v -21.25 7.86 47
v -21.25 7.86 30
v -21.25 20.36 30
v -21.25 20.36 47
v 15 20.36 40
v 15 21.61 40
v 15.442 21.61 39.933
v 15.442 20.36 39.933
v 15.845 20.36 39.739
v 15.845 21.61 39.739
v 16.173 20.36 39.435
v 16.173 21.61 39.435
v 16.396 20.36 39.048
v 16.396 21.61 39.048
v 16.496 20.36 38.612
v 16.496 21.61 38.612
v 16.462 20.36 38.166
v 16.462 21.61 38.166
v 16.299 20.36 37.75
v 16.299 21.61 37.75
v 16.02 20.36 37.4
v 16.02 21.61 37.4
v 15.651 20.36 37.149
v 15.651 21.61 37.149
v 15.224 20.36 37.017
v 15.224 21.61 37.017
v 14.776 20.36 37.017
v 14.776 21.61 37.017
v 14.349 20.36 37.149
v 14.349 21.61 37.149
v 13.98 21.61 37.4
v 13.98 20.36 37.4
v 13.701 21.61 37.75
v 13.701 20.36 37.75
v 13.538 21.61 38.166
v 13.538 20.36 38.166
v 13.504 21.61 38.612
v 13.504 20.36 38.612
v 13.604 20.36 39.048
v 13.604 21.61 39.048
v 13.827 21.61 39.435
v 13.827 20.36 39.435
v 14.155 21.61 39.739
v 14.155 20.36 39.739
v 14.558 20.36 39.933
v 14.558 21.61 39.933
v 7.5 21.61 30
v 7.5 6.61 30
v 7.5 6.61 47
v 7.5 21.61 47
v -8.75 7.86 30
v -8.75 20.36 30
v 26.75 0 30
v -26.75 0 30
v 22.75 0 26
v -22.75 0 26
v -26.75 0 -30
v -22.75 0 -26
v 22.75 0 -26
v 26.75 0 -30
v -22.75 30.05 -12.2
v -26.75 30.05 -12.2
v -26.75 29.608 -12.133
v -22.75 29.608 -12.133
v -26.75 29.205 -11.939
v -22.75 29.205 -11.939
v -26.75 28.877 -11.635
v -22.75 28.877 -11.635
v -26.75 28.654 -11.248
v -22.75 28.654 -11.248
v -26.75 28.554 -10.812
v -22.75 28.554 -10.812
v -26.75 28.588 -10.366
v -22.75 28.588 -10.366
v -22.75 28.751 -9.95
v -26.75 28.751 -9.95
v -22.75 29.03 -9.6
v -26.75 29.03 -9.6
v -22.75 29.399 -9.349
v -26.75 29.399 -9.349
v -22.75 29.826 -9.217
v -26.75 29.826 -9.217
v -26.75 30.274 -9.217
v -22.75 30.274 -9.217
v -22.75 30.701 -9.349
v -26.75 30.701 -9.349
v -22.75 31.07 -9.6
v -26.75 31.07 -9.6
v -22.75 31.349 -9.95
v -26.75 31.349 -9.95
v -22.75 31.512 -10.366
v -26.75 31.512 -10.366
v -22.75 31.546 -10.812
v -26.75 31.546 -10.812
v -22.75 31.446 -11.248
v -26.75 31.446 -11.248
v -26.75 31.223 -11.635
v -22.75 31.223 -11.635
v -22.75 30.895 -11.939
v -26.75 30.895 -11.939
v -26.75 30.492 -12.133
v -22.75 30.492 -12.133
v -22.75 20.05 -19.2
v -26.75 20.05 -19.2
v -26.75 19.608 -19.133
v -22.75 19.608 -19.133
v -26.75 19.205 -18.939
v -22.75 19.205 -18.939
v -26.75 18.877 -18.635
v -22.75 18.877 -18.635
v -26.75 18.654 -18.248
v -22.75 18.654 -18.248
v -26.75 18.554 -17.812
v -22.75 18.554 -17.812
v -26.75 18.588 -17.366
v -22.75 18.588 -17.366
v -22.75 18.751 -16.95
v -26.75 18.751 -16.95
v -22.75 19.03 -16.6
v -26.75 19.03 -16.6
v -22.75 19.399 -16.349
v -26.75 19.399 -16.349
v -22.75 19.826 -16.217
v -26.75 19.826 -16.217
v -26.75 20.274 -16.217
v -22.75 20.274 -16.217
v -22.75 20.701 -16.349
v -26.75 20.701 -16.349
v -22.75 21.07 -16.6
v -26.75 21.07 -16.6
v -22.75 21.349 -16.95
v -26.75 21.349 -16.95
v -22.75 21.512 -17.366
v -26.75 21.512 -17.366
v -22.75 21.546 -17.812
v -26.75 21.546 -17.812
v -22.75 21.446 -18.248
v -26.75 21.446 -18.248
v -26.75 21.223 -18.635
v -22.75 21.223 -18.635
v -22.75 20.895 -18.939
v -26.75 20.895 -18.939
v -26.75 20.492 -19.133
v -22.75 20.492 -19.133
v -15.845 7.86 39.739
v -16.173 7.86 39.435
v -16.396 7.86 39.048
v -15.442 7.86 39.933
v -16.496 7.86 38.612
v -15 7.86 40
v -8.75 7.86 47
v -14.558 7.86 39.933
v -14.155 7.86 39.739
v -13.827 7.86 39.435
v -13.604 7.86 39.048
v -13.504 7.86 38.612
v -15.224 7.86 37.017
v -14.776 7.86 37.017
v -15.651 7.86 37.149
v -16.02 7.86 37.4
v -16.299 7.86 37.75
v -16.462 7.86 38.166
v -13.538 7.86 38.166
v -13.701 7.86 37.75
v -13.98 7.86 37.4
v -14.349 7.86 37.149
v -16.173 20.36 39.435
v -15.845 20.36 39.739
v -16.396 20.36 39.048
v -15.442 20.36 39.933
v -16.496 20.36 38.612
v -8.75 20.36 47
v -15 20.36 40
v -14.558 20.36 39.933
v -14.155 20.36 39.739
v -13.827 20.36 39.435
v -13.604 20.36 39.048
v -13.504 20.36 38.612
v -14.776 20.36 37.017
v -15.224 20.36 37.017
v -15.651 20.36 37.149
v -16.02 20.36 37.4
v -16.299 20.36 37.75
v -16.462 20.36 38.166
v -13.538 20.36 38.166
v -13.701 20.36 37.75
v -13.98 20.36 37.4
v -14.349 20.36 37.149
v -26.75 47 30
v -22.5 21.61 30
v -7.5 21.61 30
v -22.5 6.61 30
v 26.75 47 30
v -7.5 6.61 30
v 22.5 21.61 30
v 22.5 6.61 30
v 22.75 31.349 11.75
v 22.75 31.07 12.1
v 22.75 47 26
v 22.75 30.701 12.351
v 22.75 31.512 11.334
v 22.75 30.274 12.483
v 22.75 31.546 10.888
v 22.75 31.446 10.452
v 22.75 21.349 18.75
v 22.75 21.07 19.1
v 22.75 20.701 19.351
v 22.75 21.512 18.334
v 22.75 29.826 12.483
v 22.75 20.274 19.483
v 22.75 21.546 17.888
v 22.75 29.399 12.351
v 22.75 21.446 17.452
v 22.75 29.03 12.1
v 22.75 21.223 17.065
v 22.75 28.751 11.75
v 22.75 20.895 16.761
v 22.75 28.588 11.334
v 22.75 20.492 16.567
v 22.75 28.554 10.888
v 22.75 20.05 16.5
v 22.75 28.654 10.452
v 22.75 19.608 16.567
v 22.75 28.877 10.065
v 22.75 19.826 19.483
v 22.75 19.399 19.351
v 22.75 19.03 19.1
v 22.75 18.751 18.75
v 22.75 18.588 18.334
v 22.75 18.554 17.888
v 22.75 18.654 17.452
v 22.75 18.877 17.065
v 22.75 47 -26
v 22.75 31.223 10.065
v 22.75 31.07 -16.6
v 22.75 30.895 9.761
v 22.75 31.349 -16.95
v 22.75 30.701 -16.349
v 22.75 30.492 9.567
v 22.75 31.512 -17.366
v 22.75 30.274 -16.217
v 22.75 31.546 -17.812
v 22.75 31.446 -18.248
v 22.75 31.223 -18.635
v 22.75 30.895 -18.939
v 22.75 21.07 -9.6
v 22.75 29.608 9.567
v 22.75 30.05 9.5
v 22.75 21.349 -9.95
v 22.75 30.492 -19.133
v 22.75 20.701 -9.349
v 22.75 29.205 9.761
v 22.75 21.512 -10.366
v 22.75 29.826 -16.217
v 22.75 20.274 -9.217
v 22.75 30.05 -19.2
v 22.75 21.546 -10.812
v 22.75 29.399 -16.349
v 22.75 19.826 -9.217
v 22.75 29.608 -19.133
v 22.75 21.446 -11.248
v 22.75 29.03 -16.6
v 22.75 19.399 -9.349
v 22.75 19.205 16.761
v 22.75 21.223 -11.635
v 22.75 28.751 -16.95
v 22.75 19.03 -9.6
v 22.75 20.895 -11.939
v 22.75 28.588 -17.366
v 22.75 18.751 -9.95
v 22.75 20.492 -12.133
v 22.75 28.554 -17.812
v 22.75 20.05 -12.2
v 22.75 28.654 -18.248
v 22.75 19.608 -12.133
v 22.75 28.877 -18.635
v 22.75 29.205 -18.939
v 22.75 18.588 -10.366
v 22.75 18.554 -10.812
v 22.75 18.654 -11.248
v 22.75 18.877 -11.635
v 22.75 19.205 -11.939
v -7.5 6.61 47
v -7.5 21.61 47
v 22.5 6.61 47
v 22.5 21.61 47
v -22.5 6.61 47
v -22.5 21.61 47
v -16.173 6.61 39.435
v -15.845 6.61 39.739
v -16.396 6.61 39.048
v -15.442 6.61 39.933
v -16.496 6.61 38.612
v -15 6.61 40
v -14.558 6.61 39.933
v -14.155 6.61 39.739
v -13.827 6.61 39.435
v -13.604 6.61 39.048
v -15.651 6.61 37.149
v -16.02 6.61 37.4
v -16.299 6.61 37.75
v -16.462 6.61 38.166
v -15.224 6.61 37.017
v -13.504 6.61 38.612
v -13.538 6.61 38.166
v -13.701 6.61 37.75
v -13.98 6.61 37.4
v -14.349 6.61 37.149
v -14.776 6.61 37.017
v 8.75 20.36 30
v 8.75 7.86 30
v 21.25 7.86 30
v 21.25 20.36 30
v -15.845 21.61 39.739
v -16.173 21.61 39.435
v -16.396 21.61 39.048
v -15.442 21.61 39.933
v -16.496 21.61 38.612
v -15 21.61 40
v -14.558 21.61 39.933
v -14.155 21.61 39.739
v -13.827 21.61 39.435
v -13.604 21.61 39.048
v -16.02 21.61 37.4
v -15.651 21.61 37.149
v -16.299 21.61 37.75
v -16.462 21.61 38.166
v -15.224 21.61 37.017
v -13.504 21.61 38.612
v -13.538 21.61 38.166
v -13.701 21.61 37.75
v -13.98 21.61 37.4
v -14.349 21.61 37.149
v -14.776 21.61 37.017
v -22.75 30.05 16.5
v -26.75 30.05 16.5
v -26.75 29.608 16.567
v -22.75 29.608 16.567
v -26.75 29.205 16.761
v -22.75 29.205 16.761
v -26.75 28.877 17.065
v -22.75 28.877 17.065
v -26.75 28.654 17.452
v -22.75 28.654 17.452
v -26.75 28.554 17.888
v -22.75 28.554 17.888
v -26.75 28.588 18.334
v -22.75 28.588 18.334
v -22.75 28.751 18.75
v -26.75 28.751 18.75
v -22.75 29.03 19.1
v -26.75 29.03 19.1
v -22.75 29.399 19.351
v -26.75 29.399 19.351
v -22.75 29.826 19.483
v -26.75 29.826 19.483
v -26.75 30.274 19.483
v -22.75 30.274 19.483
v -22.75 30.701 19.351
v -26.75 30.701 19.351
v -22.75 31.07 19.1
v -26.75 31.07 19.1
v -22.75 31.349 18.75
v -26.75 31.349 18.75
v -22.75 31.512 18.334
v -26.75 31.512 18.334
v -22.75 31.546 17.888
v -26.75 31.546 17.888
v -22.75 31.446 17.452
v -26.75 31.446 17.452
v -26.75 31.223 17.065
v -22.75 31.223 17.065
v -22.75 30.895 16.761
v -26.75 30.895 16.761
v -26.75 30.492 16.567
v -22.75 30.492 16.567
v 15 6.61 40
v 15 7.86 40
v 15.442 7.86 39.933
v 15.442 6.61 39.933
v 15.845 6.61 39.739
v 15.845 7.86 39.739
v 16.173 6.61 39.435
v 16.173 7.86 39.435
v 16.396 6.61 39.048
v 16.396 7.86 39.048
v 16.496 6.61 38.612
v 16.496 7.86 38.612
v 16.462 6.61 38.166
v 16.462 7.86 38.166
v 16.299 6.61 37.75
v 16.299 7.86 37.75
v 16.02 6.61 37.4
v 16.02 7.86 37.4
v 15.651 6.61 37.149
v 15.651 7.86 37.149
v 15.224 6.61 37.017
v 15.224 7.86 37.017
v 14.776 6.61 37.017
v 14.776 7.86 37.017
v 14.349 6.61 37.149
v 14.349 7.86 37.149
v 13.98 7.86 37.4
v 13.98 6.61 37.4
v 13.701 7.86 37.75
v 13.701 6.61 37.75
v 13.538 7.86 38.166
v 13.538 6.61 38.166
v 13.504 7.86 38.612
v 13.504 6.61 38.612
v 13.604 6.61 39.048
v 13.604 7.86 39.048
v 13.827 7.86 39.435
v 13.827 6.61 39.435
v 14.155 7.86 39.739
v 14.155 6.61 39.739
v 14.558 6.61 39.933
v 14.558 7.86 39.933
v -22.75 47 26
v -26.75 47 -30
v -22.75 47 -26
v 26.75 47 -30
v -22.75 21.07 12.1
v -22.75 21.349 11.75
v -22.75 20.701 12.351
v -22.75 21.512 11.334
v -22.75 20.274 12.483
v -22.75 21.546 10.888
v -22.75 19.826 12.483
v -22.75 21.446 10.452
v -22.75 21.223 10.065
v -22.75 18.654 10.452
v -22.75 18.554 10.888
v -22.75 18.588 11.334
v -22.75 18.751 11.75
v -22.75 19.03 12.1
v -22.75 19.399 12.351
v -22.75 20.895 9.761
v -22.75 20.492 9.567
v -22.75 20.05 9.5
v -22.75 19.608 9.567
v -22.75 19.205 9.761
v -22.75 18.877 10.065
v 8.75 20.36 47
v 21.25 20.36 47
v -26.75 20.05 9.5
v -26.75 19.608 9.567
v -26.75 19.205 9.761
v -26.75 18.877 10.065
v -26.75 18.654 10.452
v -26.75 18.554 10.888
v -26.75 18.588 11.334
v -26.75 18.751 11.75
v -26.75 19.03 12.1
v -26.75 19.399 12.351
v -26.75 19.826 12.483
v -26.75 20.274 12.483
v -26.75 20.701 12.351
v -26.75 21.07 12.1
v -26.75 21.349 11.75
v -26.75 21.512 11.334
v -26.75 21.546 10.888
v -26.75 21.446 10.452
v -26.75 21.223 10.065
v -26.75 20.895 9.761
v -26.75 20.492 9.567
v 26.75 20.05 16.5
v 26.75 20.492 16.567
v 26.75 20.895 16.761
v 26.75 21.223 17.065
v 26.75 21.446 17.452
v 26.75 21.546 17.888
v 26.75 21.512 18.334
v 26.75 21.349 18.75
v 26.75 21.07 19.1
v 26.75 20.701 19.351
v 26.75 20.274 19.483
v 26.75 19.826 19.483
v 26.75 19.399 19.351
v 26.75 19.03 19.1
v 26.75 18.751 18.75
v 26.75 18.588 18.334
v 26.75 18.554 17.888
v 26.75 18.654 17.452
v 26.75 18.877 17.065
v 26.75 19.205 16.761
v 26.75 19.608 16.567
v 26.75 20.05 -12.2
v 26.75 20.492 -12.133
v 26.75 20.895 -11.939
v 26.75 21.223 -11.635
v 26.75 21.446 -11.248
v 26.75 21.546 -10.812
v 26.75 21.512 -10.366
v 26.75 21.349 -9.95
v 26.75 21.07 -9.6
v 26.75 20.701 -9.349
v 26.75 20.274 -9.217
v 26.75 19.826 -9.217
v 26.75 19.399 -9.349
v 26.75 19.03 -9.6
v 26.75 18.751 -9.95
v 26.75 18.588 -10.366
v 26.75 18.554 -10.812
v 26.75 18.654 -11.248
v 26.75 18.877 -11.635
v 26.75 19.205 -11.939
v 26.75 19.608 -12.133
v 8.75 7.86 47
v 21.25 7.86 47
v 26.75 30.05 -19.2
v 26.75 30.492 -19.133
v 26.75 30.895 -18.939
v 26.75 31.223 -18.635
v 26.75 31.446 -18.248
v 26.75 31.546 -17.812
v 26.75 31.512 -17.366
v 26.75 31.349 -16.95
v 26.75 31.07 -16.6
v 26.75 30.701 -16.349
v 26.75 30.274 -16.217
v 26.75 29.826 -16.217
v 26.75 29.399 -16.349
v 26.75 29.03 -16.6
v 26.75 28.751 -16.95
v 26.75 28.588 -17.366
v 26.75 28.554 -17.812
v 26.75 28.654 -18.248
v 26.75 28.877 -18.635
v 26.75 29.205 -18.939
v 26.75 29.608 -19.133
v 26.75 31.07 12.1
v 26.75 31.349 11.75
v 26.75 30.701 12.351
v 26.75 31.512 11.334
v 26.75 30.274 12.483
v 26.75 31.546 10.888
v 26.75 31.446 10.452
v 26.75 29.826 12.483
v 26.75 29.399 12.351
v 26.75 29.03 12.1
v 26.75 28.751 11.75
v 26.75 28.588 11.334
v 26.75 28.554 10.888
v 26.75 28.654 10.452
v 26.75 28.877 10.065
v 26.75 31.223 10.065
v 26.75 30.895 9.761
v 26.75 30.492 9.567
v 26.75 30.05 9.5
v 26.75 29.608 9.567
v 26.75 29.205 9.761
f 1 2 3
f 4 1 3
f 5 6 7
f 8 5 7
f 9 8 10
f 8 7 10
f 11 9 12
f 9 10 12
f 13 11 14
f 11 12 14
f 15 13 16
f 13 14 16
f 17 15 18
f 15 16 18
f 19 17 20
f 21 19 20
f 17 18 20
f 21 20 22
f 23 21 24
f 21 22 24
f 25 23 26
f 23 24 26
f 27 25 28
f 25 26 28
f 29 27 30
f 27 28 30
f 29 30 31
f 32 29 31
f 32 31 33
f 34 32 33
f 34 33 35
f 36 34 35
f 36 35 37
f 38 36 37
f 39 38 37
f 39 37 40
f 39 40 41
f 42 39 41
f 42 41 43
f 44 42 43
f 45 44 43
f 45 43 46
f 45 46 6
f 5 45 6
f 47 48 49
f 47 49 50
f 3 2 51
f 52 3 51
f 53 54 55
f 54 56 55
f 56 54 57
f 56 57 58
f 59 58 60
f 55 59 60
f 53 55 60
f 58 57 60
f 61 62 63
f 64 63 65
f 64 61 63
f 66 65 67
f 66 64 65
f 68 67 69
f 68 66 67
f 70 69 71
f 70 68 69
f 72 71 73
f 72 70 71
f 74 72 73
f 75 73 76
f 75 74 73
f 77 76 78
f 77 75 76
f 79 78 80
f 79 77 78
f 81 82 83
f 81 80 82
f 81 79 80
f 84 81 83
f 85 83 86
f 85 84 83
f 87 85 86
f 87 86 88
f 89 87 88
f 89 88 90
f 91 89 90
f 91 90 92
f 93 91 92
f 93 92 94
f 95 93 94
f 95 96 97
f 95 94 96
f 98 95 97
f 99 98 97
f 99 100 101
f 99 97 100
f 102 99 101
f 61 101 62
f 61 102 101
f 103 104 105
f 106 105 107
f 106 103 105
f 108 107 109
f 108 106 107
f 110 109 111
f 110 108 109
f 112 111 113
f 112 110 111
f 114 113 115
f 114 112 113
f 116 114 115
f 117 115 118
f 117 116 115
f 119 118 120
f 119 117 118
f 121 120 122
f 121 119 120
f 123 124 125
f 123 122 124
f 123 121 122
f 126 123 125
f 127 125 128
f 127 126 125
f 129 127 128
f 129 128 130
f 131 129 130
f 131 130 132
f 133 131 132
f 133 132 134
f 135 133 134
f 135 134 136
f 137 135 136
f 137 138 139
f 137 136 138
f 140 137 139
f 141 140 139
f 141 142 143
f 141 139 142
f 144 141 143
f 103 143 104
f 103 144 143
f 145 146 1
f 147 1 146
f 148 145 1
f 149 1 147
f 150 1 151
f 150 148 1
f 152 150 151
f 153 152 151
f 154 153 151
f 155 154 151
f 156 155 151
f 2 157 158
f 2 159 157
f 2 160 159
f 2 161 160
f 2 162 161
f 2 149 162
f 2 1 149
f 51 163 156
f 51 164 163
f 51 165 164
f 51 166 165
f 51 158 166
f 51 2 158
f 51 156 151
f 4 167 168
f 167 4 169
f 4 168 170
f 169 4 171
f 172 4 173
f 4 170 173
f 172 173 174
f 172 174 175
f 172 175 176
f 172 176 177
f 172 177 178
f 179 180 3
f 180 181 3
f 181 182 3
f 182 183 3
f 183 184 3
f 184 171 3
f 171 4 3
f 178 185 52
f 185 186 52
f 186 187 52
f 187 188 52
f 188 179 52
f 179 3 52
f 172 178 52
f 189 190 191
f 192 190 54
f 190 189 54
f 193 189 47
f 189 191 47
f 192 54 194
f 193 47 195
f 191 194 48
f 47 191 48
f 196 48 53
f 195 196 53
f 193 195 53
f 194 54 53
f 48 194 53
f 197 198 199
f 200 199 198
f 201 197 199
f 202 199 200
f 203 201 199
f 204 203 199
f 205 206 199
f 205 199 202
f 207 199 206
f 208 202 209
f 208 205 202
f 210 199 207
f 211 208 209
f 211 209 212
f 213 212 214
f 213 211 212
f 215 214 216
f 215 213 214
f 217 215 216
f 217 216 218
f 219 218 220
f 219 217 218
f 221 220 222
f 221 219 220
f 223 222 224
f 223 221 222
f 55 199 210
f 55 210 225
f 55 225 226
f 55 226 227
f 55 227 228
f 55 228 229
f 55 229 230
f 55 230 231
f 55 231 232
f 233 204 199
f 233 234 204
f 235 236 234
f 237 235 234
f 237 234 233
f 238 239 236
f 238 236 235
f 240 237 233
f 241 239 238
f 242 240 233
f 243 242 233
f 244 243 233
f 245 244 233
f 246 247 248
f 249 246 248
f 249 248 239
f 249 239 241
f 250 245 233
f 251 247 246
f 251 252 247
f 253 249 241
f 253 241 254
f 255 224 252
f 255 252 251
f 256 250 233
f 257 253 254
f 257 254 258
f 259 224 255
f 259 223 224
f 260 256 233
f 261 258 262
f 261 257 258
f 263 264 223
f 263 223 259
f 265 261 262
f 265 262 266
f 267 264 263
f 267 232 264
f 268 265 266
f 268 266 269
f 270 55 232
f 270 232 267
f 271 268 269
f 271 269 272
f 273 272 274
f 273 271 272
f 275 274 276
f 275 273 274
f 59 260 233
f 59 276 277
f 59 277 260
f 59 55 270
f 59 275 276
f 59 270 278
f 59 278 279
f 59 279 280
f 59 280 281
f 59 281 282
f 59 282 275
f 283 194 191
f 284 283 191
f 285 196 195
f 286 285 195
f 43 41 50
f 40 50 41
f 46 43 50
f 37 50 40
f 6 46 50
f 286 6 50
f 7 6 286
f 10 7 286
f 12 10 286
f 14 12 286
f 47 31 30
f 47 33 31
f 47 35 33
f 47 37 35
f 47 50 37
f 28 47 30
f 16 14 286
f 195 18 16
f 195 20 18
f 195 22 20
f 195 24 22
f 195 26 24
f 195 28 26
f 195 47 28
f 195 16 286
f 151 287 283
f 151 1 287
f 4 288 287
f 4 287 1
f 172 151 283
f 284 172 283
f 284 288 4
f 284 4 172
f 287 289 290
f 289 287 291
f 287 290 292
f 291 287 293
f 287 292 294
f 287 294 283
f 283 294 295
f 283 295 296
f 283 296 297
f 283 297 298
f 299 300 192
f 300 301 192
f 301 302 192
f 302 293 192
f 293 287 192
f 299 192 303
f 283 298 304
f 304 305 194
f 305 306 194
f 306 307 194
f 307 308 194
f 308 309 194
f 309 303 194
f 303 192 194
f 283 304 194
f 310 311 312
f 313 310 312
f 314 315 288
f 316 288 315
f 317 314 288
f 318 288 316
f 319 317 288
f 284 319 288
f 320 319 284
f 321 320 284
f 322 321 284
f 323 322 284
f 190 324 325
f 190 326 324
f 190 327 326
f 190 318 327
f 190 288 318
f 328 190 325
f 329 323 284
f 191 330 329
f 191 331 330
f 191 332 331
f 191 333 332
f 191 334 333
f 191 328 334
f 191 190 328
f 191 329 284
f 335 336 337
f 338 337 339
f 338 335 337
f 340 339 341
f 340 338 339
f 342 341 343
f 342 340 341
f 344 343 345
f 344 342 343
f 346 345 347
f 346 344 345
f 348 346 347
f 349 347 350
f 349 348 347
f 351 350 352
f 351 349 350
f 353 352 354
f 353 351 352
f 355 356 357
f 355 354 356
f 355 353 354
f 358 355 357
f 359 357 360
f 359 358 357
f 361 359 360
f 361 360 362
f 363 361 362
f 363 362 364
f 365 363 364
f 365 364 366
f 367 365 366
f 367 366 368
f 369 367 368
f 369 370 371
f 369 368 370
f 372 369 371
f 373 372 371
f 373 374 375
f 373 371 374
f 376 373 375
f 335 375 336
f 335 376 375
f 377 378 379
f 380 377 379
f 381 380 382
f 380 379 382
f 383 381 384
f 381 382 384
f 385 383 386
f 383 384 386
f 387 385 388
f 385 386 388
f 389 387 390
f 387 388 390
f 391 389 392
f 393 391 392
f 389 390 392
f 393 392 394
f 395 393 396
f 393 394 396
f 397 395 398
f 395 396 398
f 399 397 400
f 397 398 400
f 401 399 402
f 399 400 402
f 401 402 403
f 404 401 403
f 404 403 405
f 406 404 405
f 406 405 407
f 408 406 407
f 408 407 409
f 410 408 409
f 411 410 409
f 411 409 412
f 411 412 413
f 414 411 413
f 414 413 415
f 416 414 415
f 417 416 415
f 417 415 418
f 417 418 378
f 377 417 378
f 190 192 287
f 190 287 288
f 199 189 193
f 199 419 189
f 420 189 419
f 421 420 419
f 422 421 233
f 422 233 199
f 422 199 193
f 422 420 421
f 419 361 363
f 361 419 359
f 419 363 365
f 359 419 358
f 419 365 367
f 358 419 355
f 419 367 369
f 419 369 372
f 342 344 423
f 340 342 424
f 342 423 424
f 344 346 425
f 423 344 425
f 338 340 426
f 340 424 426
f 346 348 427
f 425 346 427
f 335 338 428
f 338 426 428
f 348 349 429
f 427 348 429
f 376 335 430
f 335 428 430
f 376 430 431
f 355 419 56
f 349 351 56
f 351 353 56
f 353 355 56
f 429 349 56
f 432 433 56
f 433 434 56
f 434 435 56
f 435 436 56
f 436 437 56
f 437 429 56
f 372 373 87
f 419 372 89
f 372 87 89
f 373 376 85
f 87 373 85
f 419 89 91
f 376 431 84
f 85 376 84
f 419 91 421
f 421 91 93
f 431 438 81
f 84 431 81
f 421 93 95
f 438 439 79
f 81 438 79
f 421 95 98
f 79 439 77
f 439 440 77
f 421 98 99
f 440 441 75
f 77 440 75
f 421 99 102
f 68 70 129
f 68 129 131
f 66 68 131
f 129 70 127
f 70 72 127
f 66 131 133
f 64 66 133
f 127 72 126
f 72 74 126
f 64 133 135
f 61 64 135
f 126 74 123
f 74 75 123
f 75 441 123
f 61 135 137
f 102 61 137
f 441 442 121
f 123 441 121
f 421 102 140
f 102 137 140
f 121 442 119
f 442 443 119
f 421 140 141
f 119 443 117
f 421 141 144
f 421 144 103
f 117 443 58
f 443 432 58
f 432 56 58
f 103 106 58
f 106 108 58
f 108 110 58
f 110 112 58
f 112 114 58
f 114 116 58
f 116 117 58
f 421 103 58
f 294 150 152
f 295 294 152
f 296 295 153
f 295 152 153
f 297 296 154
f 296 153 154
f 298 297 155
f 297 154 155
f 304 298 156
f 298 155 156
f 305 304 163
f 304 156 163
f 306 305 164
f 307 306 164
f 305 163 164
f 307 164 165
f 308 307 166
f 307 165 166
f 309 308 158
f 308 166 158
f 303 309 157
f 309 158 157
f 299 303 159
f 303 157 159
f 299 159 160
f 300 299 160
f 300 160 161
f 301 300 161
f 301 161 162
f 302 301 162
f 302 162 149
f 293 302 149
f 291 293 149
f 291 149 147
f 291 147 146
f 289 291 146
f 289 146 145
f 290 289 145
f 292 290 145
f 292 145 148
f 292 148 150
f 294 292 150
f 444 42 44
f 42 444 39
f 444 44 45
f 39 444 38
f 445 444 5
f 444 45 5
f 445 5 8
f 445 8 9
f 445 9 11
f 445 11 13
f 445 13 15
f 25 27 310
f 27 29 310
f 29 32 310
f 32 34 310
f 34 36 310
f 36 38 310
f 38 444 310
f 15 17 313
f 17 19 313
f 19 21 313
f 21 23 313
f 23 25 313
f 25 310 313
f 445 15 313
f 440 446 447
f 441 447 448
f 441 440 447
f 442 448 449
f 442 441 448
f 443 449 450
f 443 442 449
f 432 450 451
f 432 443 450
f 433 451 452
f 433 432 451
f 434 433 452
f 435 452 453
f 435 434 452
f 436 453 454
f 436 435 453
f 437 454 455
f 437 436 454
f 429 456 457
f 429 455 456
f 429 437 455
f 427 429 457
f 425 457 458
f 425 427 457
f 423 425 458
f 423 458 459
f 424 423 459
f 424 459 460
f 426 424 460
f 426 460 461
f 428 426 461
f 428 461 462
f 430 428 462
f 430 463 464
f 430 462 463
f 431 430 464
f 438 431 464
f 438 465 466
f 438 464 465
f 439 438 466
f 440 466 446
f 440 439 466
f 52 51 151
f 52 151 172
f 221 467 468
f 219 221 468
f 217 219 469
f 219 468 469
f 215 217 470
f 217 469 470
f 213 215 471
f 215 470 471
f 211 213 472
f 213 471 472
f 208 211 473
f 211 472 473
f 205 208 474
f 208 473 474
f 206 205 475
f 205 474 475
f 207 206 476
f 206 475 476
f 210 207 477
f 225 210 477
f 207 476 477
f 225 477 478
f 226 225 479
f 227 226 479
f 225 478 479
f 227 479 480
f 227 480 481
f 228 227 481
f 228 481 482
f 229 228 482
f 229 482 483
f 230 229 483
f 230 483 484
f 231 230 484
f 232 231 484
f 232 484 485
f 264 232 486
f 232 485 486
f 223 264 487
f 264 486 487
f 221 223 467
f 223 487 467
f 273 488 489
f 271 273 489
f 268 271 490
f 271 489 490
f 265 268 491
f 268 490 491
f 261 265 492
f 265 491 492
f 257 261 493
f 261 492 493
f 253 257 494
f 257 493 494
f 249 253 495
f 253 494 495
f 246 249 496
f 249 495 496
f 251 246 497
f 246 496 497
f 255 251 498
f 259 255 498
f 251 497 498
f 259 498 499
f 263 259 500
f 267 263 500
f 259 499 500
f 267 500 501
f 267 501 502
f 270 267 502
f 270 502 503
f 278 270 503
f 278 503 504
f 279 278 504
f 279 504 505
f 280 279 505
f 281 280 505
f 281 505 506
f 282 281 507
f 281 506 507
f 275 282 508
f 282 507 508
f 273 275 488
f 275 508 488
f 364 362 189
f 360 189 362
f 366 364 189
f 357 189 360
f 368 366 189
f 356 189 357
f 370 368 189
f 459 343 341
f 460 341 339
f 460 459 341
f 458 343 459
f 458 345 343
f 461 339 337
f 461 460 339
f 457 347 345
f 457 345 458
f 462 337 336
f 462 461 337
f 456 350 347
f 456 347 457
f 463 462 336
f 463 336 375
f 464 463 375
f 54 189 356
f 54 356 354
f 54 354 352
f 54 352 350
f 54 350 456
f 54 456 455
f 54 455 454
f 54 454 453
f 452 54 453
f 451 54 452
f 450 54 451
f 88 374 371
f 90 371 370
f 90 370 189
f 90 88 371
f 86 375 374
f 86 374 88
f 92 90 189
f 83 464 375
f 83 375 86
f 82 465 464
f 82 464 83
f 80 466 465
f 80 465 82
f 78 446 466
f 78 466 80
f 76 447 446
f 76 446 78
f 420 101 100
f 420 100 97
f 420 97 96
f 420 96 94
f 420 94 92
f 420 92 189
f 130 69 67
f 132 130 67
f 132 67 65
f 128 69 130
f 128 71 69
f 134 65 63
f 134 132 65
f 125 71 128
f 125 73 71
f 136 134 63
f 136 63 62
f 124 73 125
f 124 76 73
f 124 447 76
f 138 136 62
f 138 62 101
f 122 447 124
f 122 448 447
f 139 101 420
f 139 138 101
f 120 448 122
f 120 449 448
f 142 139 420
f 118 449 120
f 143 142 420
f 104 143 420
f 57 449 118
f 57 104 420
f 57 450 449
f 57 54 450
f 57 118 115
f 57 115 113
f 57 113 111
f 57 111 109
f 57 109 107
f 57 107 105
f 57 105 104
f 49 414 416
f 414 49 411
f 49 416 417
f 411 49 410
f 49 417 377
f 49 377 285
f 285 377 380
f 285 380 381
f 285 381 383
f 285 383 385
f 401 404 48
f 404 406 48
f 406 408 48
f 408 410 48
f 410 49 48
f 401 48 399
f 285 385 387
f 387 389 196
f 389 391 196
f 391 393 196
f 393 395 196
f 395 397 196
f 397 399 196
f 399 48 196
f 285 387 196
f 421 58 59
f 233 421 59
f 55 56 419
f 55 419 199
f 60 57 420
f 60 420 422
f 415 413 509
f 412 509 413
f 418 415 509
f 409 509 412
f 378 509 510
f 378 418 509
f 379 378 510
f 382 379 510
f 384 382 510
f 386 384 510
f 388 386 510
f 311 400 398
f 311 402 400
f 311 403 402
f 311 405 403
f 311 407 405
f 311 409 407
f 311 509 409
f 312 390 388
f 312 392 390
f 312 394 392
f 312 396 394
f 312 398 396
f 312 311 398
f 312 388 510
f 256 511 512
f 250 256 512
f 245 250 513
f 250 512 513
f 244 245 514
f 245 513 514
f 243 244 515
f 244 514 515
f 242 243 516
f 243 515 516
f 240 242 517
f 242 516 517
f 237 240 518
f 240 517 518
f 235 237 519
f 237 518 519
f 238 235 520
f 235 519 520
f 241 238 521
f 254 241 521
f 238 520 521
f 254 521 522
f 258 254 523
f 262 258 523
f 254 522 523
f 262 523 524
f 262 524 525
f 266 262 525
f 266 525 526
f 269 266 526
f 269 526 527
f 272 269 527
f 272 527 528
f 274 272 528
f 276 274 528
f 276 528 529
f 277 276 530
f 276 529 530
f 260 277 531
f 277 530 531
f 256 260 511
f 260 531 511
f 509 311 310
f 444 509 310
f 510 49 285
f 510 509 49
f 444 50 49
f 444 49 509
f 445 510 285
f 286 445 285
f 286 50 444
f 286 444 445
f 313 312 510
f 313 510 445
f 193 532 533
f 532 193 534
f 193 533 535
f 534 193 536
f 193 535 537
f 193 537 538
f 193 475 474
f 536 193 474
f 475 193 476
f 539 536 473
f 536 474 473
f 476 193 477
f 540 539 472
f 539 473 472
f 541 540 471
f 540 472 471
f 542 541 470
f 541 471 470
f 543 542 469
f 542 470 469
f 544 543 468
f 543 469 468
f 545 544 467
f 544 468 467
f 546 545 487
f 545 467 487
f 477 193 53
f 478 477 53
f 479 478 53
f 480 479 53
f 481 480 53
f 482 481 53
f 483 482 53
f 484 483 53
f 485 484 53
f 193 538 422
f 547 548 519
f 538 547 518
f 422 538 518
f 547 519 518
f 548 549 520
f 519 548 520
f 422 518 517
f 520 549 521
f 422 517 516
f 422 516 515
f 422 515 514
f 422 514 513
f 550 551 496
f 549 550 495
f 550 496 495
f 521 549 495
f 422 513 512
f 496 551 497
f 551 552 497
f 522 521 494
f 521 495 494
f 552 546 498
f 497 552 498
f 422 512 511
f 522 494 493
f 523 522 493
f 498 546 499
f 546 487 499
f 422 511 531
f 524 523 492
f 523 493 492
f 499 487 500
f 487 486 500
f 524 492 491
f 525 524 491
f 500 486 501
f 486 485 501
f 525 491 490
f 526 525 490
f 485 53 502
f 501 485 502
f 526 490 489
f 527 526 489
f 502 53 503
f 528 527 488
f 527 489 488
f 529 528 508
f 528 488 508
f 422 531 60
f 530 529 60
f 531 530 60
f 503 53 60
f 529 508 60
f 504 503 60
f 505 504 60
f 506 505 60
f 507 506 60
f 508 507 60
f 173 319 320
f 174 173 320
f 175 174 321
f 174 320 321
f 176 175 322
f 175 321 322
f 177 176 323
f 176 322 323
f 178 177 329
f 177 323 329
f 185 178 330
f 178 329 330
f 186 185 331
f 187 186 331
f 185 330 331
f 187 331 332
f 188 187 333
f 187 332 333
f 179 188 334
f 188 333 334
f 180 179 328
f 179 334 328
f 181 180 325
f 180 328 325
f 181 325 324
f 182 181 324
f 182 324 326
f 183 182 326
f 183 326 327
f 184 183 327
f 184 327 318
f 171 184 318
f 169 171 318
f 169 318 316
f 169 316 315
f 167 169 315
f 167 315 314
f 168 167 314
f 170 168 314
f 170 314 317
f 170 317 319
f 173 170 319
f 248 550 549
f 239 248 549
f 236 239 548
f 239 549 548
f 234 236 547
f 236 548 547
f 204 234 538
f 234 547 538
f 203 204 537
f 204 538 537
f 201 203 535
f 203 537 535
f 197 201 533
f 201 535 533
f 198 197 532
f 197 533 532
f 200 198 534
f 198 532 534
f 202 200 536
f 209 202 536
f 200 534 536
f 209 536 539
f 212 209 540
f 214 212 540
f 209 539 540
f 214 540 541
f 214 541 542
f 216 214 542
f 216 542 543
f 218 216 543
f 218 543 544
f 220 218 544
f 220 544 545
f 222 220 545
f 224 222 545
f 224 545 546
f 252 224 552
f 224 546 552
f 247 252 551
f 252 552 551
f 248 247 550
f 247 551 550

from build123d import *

# Parameters (mm, degrees)
SKETCH1_W           = 53.5
SKETCH1_H           = 60
SKETCH1_W_2         = 45.5
SKETCH1_H_2         = 52
BOSS_EXTRUDE1_DEPTH = 47
CUT_EXTRUDE1_START  = -4
SKETCH3_R           = 1.5
CUT_EXTRUDE1_DEPTH  = 82.273863628
LPATTERN1_COUNT     = 2
LPATTERN1_PITCH     = 28.7
SKETCH4_R           = 1.5
CUT_EXTRUDE2_DEPTH  = 4
LPATTERN2_COUNT     = 2
LPATTERN2_PITCH     = 28.7
SKETCH5_W           = 15
SKETCH5_H           = 15
SKETCH5_W_2         = 12.5
SKETCH5_H_2         = 12.5
BOSS_EXTRUDE2_DEPTH = 17
SKETCH6_R           = 1.5
CUT_EXTRUDE3_DEPTH  = 60.742904181


with BuildPart() as part:
    # Sketch1 → Boss-Extrude1 (new body)
    with BuildSketch(Plane(origin=(0, 0, 0), x_dir=(1, 0, 0), z_dir=(0, 1, 0))):
        Rectangle(SKETCH1_W, SKETCH1_H)
        Rectangle(SKETCH1_W_2, SKETCH1_H_2, mode=Mode.SUBTRACT)
    extrude(amount=BOSS_EXTRUDE1_DEPTH)

    # Sketch3 → Cut-Extrude1 (cut)
    with BuildSketch(Plane.ZY.offset(26.75).offset(CUT_EXTRUDE1_START)):
        with Locations(Location((18, 30.05, 0), (0, 0, 180))):
            Circle(SKETCH3_R)
        with Locations(Location((11, 20.05, 0), (0, 0, 180))):
            Circle(SKETCH3_R)
    cut_extrude1 = extrude(amount=CUT_EXTRUDE1_DEPTH, mode=Mode.SUBTRACT)

    # LPattern1: Cut-Extrude1 ×2
    with Locations(*[(0, 0, -i * LPATTERN1_PITCH) for i in range(1, LPATTERN1_COUNT)]):
        add(cut_extrude1, mode=Mode.SUBTRACT)

    # Sketch4 → Cut-Extrude2 (cut)
    with BuildSketch(Plane(origin=(26.75, 0, 0), x_dir=(0, 0, -1), z_dir=(1, 0, 0))):
        with Locations((-11, 30.05)):
            Circle(SKETCH4_R)
        with Locations((-18, 20.05)):
            Circle(SKETCH4_R)
    cut_extrude2 = extrude(amount=-CUT_EXTRUDE2_DEPTH, mode=Mode.SUBTRACT)

    # LPattern2: Cut-Extrude2 ×2
    with Locations(*[(0, 0, -i * LPATTERN2_PITCH) for i in range(1, LPATTERN2_COUNT)]):
        add(cut_extrude2, mode=Mode.SUBTRACT)

    # Sketch5 → Boss-Extrude2 (add)
    # profile 1 of 2: a face of its own
    with BuildSketch(Plane.XY.offset(30)):
        with Locations((-15, 14.11)):
            Rectangle(SKETCH5_W, SKETCH5_H)
        with Locations((-15, 14.11)):
            Rectangle(SKETCH5_W_2, SKETCH5_H_2, mode=Mode.SUBTRACT)
    # profile 2 of 2: a face of its own
    with BuildSketch(Plane.XY.offset(30)):
        with Locations((15, 14.11)):
            Rectangle(SKETCH5_W, SKETCH5_H)
        with Locations((15, 14.11)):
            Rectangle(SKETCH5_W_2, SKETCH5_H_2, mode=Mode.SUBTRACT)
    extrude(amount=BOSS_EXTRUDE2_DEPTH)

    # Sketch6 → Cut-Extrude3 (cut, through all)
    with BuildSketch(Plane(origin=(0, 21.61, 0), x_dir=(1, 0, 0), z_dir=(0, 1, 0))):
        with Locations(Location((-15, -38.5, 0), (0, 0, 270))):
            Circle(SKETCH6_R)
        with Locations(Location((15, -38.5, 0), (0, 0, 270))):
            Circle(SKETCH6_R)
    extrude(amount=-CUT_EXTRUDE3_DEPTH, mode=Mode.SUBTRACT)


solid = part.part
